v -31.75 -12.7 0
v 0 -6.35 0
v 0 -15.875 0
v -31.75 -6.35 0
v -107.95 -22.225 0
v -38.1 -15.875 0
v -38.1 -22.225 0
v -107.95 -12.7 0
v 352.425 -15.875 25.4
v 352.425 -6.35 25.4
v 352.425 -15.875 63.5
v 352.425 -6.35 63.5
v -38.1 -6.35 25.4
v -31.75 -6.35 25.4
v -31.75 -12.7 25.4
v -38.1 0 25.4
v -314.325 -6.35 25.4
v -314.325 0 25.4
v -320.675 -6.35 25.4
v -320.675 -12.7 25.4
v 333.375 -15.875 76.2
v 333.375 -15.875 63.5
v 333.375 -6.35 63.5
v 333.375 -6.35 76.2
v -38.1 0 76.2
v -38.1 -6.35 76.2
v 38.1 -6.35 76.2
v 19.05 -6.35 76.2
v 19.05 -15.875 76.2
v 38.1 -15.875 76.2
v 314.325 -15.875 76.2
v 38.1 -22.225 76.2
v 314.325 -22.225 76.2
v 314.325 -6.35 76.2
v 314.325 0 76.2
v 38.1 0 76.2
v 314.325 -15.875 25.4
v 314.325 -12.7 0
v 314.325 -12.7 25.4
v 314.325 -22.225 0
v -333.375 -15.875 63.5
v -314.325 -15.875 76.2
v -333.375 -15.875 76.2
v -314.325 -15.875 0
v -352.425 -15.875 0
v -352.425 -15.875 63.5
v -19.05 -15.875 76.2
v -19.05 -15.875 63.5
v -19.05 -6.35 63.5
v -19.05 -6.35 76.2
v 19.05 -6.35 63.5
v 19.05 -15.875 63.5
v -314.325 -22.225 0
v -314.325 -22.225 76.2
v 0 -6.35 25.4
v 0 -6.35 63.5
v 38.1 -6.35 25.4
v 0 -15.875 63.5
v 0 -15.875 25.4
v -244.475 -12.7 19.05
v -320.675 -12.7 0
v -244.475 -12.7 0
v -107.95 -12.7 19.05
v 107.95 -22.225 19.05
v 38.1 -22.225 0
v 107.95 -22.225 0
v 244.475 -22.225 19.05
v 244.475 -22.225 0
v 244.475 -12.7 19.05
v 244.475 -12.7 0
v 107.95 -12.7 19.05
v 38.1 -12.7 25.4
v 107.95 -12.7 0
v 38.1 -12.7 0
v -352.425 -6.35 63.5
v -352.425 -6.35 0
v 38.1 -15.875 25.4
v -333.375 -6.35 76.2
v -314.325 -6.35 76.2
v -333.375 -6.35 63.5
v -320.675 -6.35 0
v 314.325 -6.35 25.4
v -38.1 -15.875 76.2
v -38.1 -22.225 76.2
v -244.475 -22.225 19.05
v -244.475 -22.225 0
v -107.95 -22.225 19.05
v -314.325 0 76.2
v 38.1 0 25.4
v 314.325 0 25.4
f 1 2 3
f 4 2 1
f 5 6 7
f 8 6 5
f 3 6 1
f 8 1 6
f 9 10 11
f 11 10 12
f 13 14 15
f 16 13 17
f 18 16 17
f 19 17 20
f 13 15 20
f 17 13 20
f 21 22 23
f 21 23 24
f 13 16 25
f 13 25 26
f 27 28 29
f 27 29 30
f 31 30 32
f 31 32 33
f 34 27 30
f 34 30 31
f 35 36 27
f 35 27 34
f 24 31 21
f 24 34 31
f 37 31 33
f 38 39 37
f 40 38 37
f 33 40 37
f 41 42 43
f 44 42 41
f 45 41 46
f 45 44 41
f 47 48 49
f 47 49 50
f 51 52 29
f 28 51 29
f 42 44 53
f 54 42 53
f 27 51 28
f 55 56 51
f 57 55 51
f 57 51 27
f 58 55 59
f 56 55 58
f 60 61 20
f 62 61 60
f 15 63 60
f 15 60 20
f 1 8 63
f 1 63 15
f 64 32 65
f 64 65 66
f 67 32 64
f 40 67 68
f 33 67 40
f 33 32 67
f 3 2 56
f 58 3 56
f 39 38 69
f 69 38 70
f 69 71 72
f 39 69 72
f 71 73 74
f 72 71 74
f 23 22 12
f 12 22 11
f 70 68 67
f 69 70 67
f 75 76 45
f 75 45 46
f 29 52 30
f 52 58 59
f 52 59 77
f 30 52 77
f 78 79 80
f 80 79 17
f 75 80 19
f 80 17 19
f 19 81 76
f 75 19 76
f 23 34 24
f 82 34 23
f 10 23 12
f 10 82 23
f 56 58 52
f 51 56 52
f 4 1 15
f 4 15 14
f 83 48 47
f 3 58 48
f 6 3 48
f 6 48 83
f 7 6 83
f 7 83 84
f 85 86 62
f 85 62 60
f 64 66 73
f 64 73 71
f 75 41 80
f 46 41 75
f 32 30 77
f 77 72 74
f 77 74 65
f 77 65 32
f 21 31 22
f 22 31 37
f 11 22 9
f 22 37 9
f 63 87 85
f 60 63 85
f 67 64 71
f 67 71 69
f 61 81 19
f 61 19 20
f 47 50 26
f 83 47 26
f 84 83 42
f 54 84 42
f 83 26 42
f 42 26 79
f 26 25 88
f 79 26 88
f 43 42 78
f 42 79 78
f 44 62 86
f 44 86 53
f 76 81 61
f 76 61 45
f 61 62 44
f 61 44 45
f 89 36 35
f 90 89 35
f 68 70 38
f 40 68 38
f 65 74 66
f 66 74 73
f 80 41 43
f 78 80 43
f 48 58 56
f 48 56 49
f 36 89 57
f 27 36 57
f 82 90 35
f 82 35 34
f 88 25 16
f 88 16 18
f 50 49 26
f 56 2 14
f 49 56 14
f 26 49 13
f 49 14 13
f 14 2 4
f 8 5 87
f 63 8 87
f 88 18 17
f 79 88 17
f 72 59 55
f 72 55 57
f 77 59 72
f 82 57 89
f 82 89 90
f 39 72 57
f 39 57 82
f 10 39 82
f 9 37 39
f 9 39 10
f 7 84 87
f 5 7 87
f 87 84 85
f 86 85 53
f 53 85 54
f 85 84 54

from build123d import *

# Parameters (mm, degrees)
F0_W      = 352.425
F0_H      = 76.2
F1_DEPTH  = 22.225
F2_W      = 38.1
F2_H      = 6.35
F3_DEPTH  = 76.2
F4_W      = 19.05
F4_H      = 12.7
F5_DEPTH  = 9.525
F6_W      = 136.525
F6_H      = 19.05
F7_DEPTH  = 22.225
F8_W      = 212.725
F8_H      = 12.7
F9_DEPTH  = 25.4
F11_W     = 38.1
F11_H     = 25.4
F12_DEPTH = 15.876


with BuildPart() as f1:
    # F0 (on Front) → F1 (new body)
    with BuildSketch(Plane.XZ):
        with Locations((176.2125, 38.1)):
            Rectangle(F0_W, F0_H)
    extrude(amount=F1_DEPTH)

    # F2 (on face) → F3 (cut, through all)
    with BuildSketch(Plane(origin=(0, 0, 0), x_dir=(1, 0, 0), z_dir=(0, 0, -1))):
        with Locations((19.05, 19.05)):
            Rectangle(F2_W, F2_H)
        with Locations((19.05, 3.175)):
            Rectangle(F2_W, F2_H)
        with Locations((333.375, 19.05)):
            Rectangle(F2_W, F2_H)
        with Locations((333.375, 3.175)):
            Rectangle(F2_W, F2_H)
    extrude(amount=-F3_DEPTH, mode=Mode.SUBTRACT)

    # F4 (on face) → F5 (cut, through all)
    with BuildSketch(Plane.XZ.offset(15.875)):
        with Locations((9.525, 69.85)):
            Rectangle(F4_W, F4_H)
        with Locations((342.9, 69.85)):
            Rectangle(F4_W, F4_H)
    extrude(amount=-F5_DEPTH, mode=Mode.SUBTRACT)

    # F6 (on face) → F7 (cut, through all)
    with BuildSketch(Plane.XZ.offset(22.225)):
        with Locations((176.2125, 9.525)):
            Rectangle(F6_W, F6_H)
    extrude(amount=-F7_DEPTH, mode=Mode.SUBTRACT)

    # F8 (on face) → F9 (cut)
    with BuildSketch(Plane(origin=(0, 0, 0), x_dir=(1, 0, 0), z_dir=(0, 0, -1))):
        Polygon((38.1, 6.35), (38.1, 0), (107.95, 0), (107.95, 12.7), (31.75, 12.7), (31.75, 6.35), align=None)
        with Locations((214.3125, 6.35)):
            Rectangle(F8_W, F8_H)
    extrude(amount=-F9_DEPTH, mode=Mode.SUBTRACT)


with BuildPart() as f10_1:
    # F10: instance of F1
    add(f1.part.mirror(Plane.YZ))


with BuildPart() as f1_1:
    add(f1.part)

    # F11 (on face) → F12 (cut, through all)
    with BuildSketch(Plane.XZ.offset(15.875)):
        with Locations((19.05, 12.7)):
            Rectangle(F11_W, F11_H)
        with Locations((333.375, 12.7)):
            Rectangle(F11_W, F11_H)
    extrude(amount=-F12_DEPTH, mode=Mode.SUBTRACT)


solid = Compound([f10_1.part, f1_1.part])
